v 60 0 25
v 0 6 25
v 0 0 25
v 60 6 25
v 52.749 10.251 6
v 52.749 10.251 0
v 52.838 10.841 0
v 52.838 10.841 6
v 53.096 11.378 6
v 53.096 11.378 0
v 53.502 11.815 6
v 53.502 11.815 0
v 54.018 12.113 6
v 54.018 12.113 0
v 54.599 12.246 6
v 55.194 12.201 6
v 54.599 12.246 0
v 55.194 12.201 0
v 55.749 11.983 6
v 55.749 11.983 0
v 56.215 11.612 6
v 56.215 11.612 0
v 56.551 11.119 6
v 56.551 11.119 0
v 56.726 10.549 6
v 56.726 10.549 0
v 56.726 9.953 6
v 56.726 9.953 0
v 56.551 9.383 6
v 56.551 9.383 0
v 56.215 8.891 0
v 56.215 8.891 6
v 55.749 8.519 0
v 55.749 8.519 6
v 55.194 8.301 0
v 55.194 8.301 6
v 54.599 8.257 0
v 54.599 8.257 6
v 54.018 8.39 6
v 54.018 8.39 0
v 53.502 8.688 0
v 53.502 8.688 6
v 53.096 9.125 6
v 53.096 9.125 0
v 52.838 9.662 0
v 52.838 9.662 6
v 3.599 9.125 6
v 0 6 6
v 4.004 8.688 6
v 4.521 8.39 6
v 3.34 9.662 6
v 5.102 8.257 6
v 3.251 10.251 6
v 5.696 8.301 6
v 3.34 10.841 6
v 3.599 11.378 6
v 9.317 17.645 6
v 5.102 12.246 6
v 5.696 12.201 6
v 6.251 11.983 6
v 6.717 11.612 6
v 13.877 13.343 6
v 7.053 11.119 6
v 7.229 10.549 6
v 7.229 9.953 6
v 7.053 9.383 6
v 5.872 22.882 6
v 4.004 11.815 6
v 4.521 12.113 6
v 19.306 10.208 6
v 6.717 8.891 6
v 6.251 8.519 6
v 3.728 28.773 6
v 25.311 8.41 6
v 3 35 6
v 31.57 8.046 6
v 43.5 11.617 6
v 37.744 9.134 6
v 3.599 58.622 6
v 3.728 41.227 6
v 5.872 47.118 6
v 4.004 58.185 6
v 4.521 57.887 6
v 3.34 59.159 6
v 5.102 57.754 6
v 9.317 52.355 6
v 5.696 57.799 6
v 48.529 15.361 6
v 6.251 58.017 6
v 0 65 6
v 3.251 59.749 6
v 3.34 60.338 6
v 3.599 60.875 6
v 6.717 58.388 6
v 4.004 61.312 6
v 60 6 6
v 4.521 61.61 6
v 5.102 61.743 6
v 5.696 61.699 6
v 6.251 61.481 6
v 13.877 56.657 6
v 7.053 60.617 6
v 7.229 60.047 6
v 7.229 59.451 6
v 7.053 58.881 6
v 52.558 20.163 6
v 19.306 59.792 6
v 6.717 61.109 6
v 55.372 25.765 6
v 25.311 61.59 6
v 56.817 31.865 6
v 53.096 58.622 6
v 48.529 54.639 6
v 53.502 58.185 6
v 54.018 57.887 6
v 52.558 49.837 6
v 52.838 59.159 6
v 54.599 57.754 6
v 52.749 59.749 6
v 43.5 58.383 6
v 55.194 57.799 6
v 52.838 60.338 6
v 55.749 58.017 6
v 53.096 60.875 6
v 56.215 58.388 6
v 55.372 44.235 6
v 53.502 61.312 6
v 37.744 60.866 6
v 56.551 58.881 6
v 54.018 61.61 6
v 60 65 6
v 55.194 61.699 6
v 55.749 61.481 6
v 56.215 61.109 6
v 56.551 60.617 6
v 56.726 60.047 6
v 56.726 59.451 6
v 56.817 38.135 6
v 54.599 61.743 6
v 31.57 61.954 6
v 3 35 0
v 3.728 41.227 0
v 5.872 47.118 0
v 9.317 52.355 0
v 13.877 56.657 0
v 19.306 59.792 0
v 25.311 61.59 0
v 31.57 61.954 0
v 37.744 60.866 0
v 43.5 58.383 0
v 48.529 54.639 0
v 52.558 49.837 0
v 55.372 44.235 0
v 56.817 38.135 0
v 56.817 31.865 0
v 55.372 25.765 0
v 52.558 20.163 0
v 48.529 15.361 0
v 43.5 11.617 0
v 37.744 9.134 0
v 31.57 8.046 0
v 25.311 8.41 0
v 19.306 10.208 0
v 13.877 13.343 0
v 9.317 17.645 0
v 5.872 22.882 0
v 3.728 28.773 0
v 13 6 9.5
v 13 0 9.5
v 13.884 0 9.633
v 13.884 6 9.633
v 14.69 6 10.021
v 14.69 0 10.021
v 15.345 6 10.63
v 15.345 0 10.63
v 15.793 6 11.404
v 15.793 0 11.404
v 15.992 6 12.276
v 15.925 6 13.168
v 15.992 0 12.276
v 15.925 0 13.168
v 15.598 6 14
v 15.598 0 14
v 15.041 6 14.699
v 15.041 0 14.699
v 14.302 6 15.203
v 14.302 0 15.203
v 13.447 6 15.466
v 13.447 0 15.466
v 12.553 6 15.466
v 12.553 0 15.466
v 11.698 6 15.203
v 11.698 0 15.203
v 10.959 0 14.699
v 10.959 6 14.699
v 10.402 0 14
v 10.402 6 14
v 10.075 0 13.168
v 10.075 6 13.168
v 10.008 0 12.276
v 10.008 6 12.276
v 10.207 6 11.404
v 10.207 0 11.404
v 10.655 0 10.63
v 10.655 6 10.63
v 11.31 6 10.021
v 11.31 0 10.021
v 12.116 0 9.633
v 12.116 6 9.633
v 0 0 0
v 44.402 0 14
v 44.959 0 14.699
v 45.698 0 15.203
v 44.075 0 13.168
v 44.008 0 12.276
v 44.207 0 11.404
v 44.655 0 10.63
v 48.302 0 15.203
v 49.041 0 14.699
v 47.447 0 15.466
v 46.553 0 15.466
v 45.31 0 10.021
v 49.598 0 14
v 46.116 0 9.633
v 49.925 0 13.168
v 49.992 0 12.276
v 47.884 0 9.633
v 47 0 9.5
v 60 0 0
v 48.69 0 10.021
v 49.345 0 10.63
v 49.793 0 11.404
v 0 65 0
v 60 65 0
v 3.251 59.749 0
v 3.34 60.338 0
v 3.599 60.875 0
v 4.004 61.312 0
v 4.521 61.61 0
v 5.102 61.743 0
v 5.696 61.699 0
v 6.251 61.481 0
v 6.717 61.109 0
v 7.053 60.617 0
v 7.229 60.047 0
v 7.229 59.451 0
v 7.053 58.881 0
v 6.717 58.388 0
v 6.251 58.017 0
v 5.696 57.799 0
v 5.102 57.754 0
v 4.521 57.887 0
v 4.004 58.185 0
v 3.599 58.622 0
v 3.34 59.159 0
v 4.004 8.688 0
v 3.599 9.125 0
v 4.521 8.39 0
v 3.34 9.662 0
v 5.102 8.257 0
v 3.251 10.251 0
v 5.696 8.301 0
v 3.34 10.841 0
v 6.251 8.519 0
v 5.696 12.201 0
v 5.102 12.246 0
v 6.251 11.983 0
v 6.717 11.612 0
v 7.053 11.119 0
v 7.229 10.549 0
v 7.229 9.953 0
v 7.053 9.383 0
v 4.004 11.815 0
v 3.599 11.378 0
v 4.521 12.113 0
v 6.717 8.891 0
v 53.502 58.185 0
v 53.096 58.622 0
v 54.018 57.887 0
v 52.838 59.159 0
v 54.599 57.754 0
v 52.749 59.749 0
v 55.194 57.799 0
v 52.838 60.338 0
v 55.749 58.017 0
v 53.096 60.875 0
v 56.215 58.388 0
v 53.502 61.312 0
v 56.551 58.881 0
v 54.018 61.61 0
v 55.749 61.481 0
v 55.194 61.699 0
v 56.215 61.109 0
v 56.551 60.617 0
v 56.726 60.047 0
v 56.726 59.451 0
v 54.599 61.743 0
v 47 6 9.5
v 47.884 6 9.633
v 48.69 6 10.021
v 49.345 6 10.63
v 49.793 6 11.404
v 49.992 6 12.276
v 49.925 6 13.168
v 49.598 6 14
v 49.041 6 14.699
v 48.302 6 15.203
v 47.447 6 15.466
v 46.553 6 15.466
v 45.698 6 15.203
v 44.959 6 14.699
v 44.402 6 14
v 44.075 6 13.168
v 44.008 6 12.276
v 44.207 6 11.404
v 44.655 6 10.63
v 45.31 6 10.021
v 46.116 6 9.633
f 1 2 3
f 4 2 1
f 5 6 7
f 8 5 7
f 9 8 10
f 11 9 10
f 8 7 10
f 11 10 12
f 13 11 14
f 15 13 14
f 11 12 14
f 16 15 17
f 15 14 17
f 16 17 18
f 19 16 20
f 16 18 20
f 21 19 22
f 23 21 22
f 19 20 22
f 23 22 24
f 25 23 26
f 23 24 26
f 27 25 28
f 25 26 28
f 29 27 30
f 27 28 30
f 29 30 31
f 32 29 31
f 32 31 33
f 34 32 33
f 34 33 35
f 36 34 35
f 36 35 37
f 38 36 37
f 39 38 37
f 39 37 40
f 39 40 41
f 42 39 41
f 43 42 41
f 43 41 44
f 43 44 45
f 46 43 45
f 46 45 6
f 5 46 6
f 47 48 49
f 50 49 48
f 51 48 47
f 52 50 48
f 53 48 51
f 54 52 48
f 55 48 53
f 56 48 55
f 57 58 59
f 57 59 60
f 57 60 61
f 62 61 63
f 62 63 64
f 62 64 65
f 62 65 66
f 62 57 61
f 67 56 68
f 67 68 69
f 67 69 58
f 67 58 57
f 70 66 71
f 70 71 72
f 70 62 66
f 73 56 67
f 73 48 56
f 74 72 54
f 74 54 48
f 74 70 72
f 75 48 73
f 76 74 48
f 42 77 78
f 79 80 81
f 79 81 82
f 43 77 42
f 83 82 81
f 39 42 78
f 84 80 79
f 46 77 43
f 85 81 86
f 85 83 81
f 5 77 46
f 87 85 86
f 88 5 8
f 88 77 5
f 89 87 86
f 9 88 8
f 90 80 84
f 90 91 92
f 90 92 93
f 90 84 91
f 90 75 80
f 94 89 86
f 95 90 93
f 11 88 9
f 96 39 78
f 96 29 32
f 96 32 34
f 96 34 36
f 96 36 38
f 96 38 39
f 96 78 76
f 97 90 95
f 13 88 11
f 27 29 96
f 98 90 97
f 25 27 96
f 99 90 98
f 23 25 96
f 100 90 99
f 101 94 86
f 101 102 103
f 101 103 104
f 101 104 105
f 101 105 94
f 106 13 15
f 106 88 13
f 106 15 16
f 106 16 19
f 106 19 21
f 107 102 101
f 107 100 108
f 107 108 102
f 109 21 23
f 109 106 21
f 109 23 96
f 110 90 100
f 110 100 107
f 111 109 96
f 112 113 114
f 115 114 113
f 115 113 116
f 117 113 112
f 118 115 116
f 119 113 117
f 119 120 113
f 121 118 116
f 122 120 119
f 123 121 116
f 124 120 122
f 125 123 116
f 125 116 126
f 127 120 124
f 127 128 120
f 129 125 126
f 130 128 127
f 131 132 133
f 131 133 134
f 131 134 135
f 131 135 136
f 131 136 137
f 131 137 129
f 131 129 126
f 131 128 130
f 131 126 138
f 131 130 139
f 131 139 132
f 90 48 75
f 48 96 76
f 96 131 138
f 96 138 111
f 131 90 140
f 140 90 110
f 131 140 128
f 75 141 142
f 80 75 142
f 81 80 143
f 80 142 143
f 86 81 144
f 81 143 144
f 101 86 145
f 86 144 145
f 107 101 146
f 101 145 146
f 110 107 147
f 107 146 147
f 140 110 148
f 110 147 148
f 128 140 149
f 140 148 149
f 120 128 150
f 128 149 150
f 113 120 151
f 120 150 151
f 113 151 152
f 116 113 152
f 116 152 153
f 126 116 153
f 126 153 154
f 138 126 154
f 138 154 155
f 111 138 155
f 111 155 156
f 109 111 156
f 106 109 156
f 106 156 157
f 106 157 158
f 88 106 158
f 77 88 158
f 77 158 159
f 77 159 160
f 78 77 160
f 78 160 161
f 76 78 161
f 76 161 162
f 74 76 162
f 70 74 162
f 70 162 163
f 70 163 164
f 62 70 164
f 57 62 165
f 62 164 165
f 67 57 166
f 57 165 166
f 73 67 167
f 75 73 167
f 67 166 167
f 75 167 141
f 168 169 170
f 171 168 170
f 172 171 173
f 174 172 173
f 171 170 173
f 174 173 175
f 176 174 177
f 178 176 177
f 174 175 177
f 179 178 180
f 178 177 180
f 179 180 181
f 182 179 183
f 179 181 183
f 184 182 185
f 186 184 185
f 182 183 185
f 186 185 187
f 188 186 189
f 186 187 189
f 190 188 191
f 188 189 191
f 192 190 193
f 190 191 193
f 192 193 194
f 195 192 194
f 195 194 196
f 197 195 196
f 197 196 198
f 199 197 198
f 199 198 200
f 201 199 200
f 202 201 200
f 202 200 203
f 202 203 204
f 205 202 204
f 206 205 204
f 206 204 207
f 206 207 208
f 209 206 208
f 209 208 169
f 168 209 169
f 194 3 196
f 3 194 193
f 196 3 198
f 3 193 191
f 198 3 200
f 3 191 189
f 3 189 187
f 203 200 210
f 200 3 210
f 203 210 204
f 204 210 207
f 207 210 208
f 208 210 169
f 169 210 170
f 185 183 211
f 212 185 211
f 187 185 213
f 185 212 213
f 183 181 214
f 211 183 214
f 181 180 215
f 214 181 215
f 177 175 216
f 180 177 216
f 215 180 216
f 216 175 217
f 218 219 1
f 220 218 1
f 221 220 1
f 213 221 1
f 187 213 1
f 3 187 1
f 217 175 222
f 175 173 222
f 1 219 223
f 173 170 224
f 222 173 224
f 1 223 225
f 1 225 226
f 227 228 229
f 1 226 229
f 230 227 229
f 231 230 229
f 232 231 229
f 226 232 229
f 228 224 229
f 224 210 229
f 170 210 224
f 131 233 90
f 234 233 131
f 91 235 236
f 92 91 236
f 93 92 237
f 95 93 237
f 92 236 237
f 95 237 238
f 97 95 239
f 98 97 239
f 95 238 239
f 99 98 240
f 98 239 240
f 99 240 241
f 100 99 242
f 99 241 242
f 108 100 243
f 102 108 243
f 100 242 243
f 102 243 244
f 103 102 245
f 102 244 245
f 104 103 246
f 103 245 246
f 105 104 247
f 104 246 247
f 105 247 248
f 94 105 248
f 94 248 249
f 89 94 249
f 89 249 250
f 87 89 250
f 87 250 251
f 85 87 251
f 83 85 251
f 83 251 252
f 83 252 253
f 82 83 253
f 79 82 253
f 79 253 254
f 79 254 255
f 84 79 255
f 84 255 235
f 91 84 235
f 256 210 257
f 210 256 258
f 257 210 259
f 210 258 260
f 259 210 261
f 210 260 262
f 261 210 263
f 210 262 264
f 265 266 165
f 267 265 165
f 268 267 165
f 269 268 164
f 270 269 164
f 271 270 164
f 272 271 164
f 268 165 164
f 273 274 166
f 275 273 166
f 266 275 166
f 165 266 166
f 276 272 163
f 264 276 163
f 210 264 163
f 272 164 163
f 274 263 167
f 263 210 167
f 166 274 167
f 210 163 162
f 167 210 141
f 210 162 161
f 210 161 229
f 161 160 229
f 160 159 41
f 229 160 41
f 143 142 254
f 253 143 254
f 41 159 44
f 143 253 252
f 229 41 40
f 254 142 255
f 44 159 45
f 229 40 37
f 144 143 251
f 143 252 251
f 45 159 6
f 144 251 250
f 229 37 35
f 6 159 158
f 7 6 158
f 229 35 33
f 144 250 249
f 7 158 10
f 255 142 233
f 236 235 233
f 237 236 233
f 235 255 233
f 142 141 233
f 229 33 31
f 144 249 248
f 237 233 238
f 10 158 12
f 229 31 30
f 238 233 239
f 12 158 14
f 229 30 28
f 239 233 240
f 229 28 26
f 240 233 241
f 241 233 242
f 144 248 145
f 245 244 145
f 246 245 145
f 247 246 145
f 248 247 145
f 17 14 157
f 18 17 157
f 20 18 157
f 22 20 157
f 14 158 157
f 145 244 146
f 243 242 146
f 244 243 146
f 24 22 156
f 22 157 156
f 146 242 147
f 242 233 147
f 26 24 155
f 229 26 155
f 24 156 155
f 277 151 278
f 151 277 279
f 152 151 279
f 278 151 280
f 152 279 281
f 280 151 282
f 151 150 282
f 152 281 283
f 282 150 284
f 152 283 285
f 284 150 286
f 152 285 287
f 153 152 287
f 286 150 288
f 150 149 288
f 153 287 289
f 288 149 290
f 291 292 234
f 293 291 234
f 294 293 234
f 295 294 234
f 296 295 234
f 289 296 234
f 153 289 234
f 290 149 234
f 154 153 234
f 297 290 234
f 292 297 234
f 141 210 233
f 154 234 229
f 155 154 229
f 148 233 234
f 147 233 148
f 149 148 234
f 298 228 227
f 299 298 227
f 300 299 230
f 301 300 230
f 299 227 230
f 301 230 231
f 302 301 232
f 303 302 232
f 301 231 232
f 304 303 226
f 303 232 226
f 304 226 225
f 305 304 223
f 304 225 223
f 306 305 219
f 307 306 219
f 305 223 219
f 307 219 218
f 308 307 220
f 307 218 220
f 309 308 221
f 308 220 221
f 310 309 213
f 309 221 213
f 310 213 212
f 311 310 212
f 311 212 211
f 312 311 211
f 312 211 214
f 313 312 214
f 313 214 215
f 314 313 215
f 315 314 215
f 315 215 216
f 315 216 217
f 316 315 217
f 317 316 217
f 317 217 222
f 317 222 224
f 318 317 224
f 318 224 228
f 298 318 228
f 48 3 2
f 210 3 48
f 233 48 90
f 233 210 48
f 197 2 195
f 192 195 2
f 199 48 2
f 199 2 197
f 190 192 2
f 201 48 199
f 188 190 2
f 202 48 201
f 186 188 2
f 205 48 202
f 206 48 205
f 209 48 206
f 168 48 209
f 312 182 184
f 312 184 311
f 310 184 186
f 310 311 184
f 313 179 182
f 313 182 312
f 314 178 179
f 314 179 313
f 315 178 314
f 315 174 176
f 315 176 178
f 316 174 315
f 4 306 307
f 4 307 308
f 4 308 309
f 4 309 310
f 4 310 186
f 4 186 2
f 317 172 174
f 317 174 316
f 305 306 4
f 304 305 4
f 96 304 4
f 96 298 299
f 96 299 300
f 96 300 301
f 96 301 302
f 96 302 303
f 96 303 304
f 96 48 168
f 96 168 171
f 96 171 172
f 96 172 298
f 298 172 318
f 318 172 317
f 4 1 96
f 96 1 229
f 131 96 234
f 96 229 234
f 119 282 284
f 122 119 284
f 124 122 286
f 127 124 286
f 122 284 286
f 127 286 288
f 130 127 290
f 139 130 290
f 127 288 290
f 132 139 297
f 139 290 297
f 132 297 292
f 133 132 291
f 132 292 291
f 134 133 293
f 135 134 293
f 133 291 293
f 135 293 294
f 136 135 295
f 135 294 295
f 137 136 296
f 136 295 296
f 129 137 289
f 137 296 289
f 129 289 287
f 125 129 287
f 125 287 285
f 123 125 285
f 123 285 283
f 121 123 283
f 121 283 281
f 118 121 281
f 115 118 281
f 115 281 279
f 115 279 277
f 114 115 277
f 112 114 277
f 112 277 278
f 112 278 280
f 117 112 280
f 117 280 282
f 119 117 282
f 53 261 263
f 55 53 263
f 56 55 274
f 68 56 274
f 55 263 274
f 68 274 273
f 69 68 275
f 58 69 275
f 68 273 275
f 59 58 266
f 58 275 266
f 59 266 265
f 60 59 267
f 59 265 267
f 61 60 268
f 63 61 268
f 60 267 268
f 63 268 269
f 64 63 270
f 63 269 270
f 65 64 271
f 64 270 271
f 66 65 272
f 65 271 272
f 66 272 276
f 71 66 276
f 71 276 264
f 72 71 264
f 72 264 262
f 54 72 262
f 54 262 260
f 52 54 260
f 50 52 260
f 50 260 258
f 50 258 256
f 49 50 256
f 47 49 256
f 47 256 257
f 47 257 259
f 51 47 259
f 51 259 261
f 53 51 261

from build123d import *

# Parameters (mm, degrees)
SKETCH_1_W          = 60
SKETCH_1_H          = 65
EXTRUDE_1_DEPTH     = 6
SKETCH_2_W          = 60
SKETCH_2_H          = 6
EXTRUDE_2_DEPTH     = 19
CUT_EXTRUDE_2_REACH = 93.924
SKETCH_4_R          = 3
CUT_EXTRUDE_3_REACH = 93.924
SKETCH_3_R          = 27
SKETCH_3_R_2        = 2


with BuildPart() as part:
    # 草圖1 → 填料-伸長1 (new body)
    with BuildSketch(Plane.XY):
        with Locations((30, 32.5)):
            Rectangle(SKETCH_1_W, SKETCH_1_H)
    extrude(amount=EXTRUDE_1_DEPTH)

    # 草圖2 → 填料-伸長2 (add)
    with BuildSketch(Plane.XY.offset(6)):
        with Locations((30, 3)):
            Rectangle(SKETCH_2_W, SKETCH_2_H)
    extrude(amount=EXTRUDE_2_DEPTH)

    # 草圖4 → 除料-伸長2 (cut, up to next)
    with BuildSketch(Plane(origin=(0, 0, 0), x_dir=(-1, 0, 0), z_dir=(0, -1, 0)), mode=Mode.PRIVATE) as cut_extrude_2_sk1:
        with Locations(Location((-13, -12.5, 0), (0, 0, 90))):
            Circle(SKETCH_4_R)
    cut_extrude_2_tool1 = extrude(cut_extrude_2_sk1.sketch, amount=-CUT_EXTRUDE_2_REACH, mode=Mode.PRIVATE) & part.part
    # 草圖4 → 除料-伸長2 (cut, up to next)
    with BuildSketch(Plane(origin=(0, 0, 0), x_dir=(-1, 0, 0), z_dir=(0, -1, 0)), mode=Mode.PRIVATE) as cut_extrude_2_sk2:
        with Locations(Location((-47, -12.5, 0), (0, 0, 90))):
            Circle(SKETCH_4_R)
    cut_extrude_2_tool2 = extrude(cut_extrude_2_sk2.sketch, amount=-CUT_EXTRUDE_2_REACH, mode=Mode.PRIVATE) & part.part
    add(cut_extrude_2_tool1.solids().sort_by_distance((13, 0, 12.5))[0], mode=Mode.SUBTRACT)
    add(cut_extrude_2_tool2.solids().sort_by_distance((47, 0, 12.5))[0], mode=Mode.SUBTRACT)

    # 草圖3 → 除料-伸長3 (cut, up to next)
    with BuildSketch(Plane(origin=(0, 0, 0), x_dir=(-1, 0, 0), z_dir=(0, 0, -1)), mode=Mode.PRIVATE) as cut_extrude_3_sk1:
        with Locations((-30, 35)):
            Circle(SKETCH_3_R)
    cut_extrude_3_tool1 = extrude(cut_extrude_3_sk1.sketch, amount=-CUT_EXTRUDE_3_REACH, mode=Mode.PRIVATE) & part.part
    # 草圖3 → 除料-伸長3 (cut, up to next)
    with BuildSketch(Plane(origin=(0, 0, 0), x_dir=(-1, 0, 0), z_dir=(0, 0, -1)), mode=Mode.PRIVATE) as cut_extrude_3_sk2:
        with Locations((-54.748737342, 59.748737342)):
            Circle(SKETCH_3_R_2)
    cut_extrude_3_tool2 = extrude(cut_extrude_3_sk2.sketch, amount=-CUT_EXTRUDE_3_REACH, mode=Mode.PRIVATE) & part.part
    # 草圖3 → 除料-伸長3 (cut, up to next)
    with BuildSketch(Plane(origin=(0, 0, 0), x_dir=(-1, 0, 0), z_dir=(0, 0, -1)), mode=Mode.PRIVATE) as cut_extrude_3_sk3:
        with Locations((-5.251262658, 59.748737342)):
            Circle(SKETCH_3_R_2)
    cut_extrude_3_tool3 = extrude(cut_extrude_3_sk3.sketch, amount=-CUT_EXTRUDE_3_REACH, mode=Mode.PRIVATE) & part.part
    # 草圖3 → 除料-伸長3 (cut, up to next)
    with BuildSketch(Plane(origin=(0, 0, 0), x_dir=(-1, 0, 0), z_dir=(0, 0, -1)), mode=Mode.PRIVATE) as cut_extrude_3_sk4:
        with Locations((-54.748737342, 10.251262658)):
            Circle(SKETCH_3_R_2)
    cut_extrude_3_tool4 = extrude(cut_extrude_3_sk4.sketch, amount=-CUT_EXTRUDE_3_REACH, mode=Mode.PRIVATE) & part.part
    # 草圖3 → 除料-伸長3 (cut, up to next)
    with BuildSketch(Plane(origin=(0, 0, 0), x_dir=(-1, 0, 0), z_dir=(0, 0, -1)), mode=Mode.PRIVATE) as cut_extrude_3_sk5:
        with Locations((-5.251262658, 10.251262658)):
            Circle(SKETCH_3_R_2)
    cut_extrude_3_tool5 = extrude(cut_extrude_3_sk5.sketch, amount=-CUT_EXTRUDE_3_REACH, mode=Mode.PRIVATE) & part.part
    add(cut_extrude_3_tool1.solids().sort_by_distance((30, 35, 0))[0], mode=Mode.SUBTRACT)
    add(cut_extrude_3_tool2.solids().sort_by_distance((54.748737, 59.748737, 0))[0], mode=Mode.SUBTRACT)
    add(cut_extrude_3_tool3.solids().sort_by_distance((5.251263, 59.748737, 0))[0], mode=Mode.SUBTRACT)
    add(cut_extrude_3_tool4.solids().sort_by_distance((54.748737, 10.251263, 0))[0], mode=Mode.SUBTRACT)
    add(cut_extrude_3_tool5.solids().sort_by_distance((5.251263, 10.251263, 0))[0], mode=Mode.SUBTRACT)


solid = part.part
